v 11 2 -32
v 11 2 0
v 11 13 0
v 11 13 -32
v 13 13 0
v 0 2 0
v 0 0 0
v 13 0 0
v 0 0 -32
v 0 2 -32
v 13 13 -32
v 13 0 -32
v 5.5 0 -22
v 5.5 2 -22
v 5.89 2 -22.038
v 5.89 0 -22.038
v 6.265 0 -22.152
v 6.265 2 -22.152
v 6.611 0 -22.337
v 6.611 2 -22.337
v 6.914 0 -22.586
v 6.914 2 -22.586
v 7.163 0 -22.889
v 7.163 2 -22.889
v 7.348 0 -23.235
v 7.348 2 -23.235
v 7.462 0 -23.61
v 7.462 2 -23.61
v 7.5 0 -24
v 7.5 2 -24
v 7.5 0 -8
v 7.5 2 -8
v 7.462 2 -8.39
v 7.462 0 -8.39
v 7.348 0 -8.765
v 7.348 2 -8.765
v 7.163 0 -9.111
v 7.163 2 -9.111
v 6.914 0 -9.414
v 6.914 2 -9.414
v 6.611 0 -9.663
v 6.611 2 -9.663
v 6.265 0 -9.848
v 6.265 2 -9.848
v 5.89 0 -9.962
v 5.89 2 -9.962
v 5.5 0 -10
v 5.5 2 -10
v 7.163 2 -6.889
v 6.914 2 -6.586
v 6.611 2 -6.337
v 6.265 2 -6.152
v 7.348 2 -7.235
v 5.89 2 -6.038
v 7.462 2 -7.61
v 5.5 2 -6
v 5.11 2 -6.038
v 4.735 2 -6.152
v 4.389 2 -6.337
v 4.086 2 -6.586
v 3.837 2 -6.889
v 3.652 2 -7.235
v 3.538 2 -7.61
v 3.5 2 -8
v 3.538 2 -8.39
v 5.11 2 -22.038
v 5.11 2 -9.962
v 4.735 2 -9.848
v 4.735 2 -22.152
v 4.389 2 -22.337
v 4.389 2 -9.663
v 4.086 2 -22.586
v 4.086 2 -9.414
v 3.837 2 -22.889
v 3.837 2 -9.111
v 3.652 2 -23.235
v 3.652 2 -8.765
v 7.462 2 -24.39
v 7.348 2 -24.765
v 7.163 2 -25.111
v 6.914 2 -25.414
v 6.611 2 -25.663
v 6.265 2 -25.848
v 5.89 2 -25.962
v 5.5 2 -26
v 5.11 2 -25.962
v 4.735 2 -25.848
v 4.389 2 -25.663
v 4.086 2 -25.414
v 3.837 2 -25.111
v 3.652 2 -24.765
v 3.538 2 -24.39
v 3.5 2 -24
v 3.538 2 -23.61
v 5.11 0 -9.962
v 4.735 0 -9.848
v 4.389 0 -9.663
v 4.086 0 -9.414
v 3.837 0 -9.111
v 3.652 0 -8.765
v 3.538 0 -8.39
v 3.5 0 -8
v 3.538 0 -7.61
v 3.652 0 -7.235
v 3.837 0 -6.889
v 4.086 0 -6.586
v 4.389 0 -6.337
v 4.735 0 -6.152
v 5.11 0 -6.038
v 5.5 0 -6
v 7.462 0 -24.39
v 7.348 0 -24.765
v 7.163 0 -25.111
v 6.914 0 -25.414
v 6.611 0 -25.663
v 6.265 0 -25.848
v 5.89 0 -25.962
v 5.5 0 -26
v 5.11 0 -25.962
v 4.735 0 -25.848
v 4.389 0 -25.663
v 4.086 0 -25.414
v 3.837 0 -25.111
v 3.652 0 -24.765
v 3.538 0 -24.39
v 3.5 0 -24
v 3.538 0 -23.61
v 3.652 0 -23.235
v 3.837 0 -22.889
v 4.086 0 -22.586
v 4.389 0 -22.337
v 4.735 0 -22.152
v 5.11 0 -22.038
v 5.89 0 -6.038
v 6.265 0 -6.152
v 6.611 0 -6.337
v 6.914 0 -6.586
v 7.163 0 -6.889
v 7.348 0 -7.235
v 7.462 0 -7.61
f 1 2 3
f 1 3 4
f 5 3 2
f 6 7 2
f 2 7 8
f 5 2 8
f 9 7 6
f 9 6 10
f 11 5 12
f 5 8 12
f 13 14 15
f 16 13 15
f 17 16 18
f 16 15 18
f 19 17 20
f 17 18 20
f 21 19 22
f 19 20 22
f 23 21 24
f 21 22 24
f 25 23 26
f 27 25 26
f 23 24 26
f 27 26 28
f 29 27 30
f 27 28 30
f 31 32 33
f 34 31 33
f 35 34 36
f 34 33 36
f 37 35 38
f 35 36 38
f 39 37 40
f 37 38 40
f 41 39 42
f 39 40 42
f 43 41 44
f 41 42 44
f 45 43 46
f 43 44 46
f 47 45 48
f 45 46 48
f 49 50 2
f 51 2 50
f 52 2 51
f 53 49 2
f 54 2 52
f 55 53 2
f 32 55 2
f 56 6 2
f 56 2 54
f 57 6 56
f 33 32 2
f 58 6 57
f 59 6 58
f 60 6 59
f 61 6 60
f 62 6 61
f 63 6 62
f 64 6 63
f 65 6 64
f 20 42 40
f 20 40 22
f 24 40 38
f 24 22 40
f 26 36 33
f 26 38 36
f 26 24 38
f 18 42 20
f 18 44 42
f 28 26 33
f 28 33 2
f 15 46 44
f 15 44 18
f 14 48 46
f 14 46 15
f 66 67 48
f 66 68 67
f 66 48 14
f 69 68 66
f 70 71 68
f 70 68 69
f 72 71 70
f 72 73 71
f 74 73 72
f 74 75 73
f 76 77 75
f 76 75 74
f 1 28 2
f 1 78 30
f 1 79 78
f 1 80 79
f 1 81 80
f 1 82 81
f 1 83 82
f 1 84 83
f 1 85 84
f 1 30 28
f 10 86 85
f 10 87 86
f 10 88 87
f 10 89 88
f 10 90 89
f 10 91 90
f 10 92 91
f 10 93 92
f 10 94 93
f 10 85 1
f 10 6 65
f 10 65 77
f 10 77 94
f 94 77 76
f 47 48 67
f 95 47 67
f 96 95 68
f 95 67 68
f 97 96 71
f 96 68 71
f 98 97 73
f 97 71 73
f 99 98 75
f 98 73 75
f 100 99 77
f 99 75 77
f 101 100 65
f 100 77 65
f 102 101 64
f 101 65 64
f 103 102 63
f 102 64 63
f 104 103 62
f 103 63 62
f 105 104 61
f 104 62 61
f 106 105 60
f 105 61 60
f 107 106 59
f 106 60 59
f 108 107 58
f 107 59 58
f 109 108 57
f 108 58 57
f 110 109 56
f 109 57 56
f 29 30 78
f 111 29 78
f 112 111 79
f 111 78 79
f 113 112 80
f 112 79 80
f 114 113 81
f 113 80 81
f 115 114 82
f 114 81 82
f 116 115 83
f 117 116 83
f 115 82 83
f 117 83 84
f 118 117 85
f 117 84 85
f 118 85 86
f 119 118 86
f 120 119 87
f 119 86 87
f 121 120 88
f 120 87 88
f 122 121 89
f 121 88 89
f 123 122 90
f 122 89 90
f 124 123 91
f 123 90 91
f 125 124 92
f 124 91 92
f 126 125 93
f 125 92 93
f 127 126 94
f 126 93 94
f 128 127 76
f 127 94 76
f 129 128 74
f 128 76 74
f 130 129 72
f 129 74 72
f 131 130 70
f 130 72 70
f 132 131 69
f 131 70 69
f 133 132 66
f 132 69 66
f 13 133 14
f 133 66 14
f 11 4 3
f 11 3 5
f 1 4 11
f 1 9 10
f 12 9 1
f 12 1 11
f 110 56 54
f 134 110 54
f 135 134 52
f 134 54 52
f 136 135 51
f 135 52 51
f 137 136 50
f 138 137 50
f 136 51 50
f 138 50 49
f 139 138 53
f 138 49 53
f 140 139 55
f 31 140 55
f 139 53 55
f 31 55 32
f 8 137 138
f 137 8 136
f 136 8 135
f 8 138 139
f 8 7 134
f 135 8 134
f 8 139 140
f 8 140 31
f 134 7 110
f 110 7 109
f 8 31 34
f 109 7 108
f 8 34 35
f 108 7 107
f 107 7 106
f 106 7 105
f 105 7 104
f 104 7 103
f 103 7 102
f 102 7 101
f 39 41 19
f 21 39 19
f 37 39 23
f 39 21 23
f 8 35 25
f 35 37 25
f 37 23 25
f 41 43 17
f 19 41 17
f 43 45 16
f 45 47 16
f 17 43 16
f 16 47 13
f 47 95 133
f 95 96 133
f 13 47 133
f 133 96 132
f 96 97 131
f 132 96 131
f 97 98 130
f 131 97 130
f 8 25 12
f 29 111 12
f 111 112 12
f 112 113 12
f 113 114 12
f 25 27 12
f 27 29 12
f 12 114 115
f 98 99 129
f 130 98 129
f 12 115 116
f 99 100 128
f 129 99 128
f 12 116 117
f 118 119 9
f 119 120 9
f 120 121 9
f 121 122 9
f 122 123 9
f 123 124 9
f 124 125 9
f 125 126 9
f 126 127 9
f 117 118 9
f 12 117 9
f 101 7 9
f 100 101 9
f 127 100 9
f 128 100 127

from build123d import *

# Parameters (mm, degrees)
SKETCH1_W           = 11
SKETCH1_H           = 32
BOSS_EXTRUDE1_DEPTH = 2
SKETCH4_W           = 32
SKETCH4_H           = 2
BOSS_EXTRUDE2_DEPTH = 2
SKETCH5_W           = 2
SKETCH5_H           = 32
BOSS_EXTRUDE3_DEPTH = 11
CUT_EXTRUDE6_DEPTH  = 37.249137921


with BuildPart() as part:
    # Sketch1 → Boss-Extrude1 (new body)
    with BuildSketch(Plane(origin=(0, 0, 0), x_dir=(1, 0, 0), z_dir=(0, 1, 0))):
        with Locations((5.5, 16)):
            Rectangle(SKETCH1_W, SKETCH1_H)
    extrude(amount=BOSS_EXTRUDE1_DEPTH)

    # Sketch4 → Boss-Extrude2 (add)
    with BuildSketch(Plane(origin=(11, 0, 0), x_dir=(0, 0, -1), z_dir=(1, 0, 0))):
        with Locations((16, 1)):
            Rectangle(SKETCH4_W, SKETCH4_H)
    extrude(amount=BOSS_EXTRUDE2_DEPTH)

    # Sketch5 → Boss-Extrude3 (add)
    with BuildSketch(Plane(origin=(0, 2, 0), x_dir=(1, 0, 0), z_dir=(0, 1, 0))):
        with Locations((12, 16)):
            Rectangle(SKETCH5_W, SKETCH5_H)
    extrude(amount=BOSS_EXTRUDE3_DEPTH)

    # Sketch6 → Cut-Extrude6 (cut, through all)
    with BuildSketch(Plane(origin=(0, 2, 0), x_dir=(1, 0, 0), z_dir=(0, 1, 0))):
        with BuildLine():
            ThreePointArc((7.5, 8), (6.914213562, 9.414213562), (5.5, 10))
            Line((5.5, 10), (5.5, 6))
            ThreePointArc((5.5, 6), (6.914213562, 6.585786438), (7.5, 8))
        make_face()
        with BuildLine():
            Line((5.5, 6), (5.5, 10))
            ThreePointArc((5.5, 10), (3.5, 8), (5.5, 6))
        make_face()
        with BuildLine():
            ThreePointArc((5.5, 26), (3.5, 24), (5.5, 22))
            Line((5.5, 22), (5.5, 26))
        make_face()
        with BuildLine():
            Line((5.5, 26), (5.5, 22))
            ThreePointArc((5.5, 22), (6.914213562, 22.585786438), (7.5, 24))
            ThreePointArc((7.5, 24), (6.914213562, 25.414213562), (5.5, 26))
        make_face()
    extrude(amount=-CUT_EXTRUDE6_DEPTH, mode=Mode.SUBTRACT)


solid = part.part
